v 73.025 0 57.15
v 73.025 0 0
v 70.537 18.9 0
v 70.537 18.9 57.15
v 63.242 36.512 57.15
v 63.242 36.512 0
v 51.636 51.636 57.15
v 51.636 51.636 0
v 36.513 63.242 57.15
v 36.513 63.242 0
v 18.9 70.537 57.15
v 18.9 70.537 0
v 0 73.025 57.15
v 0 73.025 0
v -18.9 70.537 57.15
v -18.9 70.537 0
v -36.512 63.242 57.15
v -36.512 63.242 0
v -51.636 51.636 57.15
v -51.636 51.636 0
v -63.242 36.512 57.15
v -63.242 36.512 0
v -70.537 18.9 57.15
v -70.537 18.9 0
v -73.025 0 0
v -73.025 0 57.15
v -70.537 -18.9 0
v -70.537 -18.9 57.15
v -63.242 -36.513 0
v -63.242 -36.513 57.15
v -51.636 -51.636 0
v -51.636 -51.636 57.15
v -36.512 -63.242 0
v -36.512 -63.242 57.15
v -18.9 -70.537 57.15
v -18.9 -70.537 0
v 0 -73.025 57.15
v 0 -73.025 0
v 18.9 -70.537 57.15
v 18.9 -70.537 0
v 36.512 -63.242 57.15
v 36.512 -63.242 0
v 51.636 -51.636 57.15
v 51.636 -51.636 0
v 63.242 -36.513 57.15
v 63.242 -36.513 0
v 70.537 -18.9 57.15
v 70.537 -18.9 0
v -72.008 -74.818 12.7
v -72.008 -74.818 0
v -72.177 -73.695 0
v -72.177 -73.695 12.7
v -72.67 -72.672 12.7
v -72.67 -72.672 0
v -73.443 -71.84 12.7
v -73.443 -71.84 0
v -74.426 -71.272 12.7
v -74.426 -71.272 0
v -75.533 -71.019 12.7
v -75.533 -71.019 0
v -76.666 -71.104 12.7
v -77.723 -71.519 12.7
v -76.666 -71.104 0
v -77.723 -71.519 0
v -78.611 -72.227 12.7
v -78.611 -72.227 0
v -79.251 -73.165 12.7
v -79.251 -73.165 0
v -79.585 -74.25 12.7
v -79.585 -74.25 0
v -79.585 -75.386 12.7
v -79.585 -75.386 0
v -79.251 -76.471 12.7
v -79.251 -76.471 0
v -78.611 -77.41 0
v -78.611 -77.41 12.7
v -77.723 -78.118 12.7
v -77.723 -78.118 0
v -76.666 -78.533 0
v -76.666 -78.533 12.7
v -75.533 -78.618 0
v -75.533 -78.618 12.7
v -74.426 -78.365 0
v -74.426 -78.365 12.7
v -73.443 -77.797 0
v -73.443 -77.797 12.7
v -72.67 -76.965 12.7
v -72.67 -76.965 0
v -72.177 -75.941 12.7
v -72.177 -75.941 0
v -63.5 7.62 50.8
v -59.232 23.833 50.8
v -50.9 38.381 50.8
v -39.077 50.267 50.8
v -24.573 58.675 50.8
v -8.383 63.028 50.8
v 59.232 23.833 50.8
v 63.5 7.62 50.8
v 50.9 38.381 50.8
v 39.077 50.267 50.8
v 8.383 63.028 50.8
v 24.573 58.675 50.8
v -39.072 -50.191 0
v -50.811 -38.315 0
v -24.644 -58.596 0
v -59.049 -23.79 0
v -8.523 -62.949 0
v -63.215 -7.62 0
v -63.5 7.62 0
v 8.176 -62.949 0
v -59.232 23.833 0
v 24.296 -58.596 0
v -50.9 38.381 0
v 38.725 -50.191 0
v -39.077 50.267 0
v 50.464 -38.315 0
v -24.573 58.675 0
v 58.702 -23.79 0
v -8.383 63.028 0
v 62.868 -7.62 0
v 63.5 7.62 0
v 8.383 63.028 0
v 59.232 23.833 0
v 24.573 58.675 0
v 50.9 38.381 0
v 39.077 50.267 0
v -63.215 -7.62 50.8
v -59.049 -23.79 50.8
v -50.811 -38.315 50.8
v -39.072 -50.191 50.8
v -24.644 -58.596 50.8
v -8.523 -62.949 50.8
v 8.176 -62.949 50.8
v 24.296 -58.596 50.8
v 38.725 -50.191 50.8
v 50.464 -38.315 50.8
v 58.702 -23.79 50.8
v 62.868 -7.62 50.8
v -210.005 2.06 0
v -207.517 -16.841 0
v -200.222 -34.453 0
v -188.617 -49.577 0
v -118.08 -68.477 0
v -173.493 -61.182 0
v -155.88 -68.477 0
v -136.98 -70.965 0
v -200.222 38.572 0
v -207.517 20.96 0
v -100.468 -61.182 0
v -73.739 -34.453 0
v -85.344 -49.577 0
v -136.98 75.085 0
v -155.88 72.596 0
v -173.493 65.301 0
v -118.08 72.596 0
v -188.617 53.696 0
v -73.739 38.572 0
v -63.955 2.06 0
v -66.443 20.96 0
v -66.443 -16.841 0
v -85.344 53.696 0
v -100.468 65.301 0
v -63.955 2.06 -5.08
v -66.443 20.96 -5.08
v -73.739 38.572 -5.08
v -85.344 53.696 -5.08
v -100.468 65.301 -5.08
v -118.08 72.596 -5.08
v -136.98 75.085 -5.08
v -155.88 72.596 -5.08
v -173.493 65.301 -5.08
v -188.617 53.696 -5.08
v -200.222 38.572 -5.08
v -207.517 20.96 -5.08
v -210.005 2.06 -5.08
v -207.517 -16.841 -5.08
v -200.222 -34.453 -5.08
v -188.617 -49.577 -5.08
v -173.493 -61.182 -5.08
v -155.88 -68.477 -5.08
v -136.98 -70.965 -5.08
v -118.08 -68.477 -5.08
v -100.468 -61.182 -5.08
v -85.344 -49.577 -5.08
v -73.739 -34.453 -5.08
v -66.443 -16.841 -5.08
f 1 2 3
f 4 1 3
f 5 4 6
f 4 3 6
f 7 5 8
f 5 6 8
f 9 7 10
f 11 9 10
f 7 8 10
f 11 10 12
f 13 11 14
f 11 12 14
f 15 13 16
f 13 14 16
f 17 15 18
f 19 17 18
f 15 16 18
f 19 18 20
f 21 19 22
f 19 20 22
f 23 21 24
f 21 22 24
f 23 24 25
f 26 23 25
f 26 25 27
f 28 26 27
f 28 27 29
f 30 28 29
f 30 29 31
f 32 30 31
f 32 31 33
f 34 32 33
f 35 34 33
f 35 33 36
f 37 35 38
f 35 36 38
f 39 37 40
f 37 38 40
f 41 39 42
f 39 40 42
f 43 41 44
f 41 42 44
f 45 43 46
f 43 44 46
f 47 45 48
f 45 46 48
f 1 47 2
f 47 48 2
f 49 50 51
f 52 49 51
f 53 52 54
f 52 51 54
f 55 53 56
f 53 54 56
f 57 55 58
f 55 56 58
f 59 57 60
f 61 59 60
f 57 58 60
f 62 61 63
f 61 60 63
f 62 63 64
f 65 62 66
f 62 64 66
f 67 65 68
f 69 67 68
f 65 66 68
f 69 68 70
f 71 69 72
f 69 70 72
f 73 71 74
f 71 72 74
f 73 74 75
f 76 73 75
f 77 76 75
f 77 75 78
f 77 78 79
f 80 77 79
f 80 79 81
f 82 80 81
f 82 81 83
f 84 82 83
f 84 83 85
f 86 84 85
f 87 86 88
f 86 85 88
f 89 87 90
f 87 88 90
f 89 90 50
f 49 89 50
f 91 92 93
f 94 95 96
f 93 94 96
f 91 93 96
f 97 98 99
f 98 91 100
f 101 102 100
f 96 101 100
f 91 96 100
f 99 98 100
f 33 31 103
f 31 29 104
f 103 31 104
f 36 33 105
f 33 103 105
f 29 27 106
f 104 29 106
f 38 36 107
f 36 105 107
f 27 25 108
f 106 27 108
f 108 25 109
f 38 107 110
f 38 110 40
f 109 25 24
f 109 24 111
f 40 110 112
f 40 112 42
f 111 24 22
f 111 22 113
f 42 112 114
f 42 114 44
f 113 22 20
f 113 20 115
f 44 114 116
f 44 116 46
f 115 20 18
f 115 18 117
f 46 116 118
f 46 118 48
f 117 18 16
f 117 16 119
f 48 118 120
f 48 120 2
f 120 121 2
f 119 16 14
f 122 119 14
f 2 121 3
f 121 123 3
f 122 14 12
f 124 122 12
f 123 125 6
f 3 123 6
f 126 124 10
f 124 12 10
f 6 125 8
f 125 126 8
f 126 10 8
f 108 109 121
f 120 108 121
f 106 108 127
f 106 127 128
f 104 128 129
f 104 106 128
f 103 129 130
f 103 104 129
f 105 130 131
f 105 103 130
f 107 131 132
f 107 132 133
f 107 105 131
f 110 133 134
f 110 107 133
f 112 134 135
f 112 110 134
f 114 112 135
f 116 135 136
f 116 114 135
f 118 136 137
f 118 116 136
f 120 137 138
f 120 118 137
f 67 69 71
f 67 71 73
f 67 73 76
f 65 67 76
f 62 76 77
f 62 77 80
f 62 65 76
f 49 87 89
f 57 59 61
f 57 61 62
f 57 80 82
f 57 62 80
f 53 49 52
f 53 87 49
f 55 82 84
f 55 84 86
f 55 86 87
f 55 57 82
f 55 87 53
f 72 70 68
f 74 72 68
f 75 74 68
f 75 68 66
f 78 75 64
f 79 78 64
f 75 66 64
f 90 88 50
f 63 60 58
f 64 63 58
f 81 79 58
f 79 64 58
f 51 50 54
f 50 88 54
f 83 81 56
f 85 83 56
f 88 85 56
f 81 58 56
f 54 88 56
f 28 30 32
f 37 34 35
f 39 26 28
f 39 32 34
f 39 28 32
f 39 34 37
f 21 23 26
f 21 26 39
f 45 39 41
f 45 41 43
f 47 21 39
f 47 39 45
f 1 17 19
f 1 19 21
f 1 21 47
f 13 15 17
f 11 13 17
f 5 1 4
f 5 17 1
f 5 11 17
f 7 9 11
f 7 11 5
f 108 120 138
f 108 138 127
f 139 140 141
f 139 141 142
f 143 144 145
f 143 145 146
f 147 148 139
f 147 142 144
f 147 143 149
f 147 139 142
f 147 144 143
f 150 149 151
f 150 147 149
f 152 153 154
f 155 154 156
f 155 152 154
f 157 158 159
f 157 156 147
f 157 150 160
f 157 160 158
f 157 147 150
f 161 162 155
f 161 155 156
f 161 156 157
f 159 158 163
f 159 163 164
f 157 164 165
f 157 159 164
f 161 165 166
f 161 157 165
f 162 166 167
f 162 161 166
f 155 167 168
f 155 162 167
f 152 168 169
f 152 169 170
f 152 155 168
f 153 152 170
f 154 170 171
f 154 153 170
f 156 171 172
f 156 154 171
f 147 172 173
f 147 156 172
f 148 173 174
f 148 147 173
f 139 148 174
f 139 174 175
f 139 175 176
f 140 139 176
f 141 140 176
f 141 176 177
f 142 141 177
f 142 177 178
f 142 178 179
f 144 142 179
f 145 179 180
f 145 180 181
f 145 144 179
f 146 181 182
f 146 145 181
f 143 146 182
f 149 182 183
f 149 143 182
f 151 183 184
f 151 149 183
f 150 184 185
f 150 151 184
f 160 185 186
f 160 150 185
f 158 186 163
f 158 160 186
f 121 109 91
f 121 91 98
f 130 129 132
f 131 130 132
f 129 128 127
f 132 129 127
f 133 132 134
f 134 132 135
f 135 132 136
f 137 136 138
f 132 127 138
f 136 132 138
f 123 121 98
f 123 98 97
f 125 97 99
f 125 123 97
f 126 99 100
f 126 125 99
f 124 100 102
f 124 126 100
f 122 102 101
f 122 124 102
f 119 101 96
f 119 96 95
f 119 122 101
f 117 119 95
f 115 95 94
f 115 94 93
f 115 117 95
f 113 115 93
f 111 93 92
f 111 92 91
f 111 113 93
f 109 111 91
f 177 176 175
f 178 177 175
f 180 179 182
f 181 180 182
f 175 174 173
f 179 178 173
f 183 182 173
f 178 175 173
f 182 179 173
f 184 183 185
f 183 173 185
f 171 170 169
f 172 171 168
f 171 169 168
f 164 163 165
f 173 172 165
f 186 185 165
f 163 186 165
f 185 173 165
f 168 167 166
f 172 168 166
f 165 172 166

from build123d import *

# Parameters (mm, degrees)
F0_R     = 73.025
F1_DEPTH = 57.15
F2_R     = 73.025
F3_DEPTH = 5.08
F5_DEPTH = 50.8
F7_DEPTH = 50.8
F8_R     = 3.81
F9_DEPTH = 12.7


with BuildPart() as f1:
    # F0 (on Top) → F1 (new body)
    with BuildSketch(Plane.XY):
        Circle(F0_R)
    extrude(amount=F1_DEPTH)

    # F4 (on Top) → F5 (cut)
    with BuildSketch(Plane.XY):
        with BuildLine():
            Line((0, -7.62), (-63.214714, -7.62))
            ThreePointArc((-63.214714, -7.62), (-0.173572, -63.5), (62.86757, -7.62))
            Line((62.86757, -7.62), (0, -7.62))
        make_face()
    extrude(amount=F5_DEPTH, mode=Mode.SUBTRACT)

    # F6 (on Top) → F7 (cut)
    with BuildSketch(Plane.XY):
        with BuildLine():
            Line((-63.5, 7.62), (0, 7.62))
            Line((0, 7.62), (63.5, 7.62))
            ThreePointArc((63.5, 7.62), (0, 63.579766), (-63.5, 7.62))
        make_face()
    extrude(amount=F7_DEPTH, mode=Mode.SUBTRACT)


with BuildPart() as f3:
    # F2 (on Top) → F3 (new body)
    with BuildSketch(Plane.XY):
        with Locations((-136.980068, 2.059609)):
            Circle(F2_R)
    extrude(amount=-F3_DEPTH)


with BuildPart() as f9:
    # F8 (on Top) → F9 (new body)
    with BuildSketch(Plane.XY):
        with Locations((-75.818039, -74.818298)):
            Circle(F8_R)
    extrude(amount=F9_DEPTH)


solid = Compound([f1.part, f3.part, f9.part])
